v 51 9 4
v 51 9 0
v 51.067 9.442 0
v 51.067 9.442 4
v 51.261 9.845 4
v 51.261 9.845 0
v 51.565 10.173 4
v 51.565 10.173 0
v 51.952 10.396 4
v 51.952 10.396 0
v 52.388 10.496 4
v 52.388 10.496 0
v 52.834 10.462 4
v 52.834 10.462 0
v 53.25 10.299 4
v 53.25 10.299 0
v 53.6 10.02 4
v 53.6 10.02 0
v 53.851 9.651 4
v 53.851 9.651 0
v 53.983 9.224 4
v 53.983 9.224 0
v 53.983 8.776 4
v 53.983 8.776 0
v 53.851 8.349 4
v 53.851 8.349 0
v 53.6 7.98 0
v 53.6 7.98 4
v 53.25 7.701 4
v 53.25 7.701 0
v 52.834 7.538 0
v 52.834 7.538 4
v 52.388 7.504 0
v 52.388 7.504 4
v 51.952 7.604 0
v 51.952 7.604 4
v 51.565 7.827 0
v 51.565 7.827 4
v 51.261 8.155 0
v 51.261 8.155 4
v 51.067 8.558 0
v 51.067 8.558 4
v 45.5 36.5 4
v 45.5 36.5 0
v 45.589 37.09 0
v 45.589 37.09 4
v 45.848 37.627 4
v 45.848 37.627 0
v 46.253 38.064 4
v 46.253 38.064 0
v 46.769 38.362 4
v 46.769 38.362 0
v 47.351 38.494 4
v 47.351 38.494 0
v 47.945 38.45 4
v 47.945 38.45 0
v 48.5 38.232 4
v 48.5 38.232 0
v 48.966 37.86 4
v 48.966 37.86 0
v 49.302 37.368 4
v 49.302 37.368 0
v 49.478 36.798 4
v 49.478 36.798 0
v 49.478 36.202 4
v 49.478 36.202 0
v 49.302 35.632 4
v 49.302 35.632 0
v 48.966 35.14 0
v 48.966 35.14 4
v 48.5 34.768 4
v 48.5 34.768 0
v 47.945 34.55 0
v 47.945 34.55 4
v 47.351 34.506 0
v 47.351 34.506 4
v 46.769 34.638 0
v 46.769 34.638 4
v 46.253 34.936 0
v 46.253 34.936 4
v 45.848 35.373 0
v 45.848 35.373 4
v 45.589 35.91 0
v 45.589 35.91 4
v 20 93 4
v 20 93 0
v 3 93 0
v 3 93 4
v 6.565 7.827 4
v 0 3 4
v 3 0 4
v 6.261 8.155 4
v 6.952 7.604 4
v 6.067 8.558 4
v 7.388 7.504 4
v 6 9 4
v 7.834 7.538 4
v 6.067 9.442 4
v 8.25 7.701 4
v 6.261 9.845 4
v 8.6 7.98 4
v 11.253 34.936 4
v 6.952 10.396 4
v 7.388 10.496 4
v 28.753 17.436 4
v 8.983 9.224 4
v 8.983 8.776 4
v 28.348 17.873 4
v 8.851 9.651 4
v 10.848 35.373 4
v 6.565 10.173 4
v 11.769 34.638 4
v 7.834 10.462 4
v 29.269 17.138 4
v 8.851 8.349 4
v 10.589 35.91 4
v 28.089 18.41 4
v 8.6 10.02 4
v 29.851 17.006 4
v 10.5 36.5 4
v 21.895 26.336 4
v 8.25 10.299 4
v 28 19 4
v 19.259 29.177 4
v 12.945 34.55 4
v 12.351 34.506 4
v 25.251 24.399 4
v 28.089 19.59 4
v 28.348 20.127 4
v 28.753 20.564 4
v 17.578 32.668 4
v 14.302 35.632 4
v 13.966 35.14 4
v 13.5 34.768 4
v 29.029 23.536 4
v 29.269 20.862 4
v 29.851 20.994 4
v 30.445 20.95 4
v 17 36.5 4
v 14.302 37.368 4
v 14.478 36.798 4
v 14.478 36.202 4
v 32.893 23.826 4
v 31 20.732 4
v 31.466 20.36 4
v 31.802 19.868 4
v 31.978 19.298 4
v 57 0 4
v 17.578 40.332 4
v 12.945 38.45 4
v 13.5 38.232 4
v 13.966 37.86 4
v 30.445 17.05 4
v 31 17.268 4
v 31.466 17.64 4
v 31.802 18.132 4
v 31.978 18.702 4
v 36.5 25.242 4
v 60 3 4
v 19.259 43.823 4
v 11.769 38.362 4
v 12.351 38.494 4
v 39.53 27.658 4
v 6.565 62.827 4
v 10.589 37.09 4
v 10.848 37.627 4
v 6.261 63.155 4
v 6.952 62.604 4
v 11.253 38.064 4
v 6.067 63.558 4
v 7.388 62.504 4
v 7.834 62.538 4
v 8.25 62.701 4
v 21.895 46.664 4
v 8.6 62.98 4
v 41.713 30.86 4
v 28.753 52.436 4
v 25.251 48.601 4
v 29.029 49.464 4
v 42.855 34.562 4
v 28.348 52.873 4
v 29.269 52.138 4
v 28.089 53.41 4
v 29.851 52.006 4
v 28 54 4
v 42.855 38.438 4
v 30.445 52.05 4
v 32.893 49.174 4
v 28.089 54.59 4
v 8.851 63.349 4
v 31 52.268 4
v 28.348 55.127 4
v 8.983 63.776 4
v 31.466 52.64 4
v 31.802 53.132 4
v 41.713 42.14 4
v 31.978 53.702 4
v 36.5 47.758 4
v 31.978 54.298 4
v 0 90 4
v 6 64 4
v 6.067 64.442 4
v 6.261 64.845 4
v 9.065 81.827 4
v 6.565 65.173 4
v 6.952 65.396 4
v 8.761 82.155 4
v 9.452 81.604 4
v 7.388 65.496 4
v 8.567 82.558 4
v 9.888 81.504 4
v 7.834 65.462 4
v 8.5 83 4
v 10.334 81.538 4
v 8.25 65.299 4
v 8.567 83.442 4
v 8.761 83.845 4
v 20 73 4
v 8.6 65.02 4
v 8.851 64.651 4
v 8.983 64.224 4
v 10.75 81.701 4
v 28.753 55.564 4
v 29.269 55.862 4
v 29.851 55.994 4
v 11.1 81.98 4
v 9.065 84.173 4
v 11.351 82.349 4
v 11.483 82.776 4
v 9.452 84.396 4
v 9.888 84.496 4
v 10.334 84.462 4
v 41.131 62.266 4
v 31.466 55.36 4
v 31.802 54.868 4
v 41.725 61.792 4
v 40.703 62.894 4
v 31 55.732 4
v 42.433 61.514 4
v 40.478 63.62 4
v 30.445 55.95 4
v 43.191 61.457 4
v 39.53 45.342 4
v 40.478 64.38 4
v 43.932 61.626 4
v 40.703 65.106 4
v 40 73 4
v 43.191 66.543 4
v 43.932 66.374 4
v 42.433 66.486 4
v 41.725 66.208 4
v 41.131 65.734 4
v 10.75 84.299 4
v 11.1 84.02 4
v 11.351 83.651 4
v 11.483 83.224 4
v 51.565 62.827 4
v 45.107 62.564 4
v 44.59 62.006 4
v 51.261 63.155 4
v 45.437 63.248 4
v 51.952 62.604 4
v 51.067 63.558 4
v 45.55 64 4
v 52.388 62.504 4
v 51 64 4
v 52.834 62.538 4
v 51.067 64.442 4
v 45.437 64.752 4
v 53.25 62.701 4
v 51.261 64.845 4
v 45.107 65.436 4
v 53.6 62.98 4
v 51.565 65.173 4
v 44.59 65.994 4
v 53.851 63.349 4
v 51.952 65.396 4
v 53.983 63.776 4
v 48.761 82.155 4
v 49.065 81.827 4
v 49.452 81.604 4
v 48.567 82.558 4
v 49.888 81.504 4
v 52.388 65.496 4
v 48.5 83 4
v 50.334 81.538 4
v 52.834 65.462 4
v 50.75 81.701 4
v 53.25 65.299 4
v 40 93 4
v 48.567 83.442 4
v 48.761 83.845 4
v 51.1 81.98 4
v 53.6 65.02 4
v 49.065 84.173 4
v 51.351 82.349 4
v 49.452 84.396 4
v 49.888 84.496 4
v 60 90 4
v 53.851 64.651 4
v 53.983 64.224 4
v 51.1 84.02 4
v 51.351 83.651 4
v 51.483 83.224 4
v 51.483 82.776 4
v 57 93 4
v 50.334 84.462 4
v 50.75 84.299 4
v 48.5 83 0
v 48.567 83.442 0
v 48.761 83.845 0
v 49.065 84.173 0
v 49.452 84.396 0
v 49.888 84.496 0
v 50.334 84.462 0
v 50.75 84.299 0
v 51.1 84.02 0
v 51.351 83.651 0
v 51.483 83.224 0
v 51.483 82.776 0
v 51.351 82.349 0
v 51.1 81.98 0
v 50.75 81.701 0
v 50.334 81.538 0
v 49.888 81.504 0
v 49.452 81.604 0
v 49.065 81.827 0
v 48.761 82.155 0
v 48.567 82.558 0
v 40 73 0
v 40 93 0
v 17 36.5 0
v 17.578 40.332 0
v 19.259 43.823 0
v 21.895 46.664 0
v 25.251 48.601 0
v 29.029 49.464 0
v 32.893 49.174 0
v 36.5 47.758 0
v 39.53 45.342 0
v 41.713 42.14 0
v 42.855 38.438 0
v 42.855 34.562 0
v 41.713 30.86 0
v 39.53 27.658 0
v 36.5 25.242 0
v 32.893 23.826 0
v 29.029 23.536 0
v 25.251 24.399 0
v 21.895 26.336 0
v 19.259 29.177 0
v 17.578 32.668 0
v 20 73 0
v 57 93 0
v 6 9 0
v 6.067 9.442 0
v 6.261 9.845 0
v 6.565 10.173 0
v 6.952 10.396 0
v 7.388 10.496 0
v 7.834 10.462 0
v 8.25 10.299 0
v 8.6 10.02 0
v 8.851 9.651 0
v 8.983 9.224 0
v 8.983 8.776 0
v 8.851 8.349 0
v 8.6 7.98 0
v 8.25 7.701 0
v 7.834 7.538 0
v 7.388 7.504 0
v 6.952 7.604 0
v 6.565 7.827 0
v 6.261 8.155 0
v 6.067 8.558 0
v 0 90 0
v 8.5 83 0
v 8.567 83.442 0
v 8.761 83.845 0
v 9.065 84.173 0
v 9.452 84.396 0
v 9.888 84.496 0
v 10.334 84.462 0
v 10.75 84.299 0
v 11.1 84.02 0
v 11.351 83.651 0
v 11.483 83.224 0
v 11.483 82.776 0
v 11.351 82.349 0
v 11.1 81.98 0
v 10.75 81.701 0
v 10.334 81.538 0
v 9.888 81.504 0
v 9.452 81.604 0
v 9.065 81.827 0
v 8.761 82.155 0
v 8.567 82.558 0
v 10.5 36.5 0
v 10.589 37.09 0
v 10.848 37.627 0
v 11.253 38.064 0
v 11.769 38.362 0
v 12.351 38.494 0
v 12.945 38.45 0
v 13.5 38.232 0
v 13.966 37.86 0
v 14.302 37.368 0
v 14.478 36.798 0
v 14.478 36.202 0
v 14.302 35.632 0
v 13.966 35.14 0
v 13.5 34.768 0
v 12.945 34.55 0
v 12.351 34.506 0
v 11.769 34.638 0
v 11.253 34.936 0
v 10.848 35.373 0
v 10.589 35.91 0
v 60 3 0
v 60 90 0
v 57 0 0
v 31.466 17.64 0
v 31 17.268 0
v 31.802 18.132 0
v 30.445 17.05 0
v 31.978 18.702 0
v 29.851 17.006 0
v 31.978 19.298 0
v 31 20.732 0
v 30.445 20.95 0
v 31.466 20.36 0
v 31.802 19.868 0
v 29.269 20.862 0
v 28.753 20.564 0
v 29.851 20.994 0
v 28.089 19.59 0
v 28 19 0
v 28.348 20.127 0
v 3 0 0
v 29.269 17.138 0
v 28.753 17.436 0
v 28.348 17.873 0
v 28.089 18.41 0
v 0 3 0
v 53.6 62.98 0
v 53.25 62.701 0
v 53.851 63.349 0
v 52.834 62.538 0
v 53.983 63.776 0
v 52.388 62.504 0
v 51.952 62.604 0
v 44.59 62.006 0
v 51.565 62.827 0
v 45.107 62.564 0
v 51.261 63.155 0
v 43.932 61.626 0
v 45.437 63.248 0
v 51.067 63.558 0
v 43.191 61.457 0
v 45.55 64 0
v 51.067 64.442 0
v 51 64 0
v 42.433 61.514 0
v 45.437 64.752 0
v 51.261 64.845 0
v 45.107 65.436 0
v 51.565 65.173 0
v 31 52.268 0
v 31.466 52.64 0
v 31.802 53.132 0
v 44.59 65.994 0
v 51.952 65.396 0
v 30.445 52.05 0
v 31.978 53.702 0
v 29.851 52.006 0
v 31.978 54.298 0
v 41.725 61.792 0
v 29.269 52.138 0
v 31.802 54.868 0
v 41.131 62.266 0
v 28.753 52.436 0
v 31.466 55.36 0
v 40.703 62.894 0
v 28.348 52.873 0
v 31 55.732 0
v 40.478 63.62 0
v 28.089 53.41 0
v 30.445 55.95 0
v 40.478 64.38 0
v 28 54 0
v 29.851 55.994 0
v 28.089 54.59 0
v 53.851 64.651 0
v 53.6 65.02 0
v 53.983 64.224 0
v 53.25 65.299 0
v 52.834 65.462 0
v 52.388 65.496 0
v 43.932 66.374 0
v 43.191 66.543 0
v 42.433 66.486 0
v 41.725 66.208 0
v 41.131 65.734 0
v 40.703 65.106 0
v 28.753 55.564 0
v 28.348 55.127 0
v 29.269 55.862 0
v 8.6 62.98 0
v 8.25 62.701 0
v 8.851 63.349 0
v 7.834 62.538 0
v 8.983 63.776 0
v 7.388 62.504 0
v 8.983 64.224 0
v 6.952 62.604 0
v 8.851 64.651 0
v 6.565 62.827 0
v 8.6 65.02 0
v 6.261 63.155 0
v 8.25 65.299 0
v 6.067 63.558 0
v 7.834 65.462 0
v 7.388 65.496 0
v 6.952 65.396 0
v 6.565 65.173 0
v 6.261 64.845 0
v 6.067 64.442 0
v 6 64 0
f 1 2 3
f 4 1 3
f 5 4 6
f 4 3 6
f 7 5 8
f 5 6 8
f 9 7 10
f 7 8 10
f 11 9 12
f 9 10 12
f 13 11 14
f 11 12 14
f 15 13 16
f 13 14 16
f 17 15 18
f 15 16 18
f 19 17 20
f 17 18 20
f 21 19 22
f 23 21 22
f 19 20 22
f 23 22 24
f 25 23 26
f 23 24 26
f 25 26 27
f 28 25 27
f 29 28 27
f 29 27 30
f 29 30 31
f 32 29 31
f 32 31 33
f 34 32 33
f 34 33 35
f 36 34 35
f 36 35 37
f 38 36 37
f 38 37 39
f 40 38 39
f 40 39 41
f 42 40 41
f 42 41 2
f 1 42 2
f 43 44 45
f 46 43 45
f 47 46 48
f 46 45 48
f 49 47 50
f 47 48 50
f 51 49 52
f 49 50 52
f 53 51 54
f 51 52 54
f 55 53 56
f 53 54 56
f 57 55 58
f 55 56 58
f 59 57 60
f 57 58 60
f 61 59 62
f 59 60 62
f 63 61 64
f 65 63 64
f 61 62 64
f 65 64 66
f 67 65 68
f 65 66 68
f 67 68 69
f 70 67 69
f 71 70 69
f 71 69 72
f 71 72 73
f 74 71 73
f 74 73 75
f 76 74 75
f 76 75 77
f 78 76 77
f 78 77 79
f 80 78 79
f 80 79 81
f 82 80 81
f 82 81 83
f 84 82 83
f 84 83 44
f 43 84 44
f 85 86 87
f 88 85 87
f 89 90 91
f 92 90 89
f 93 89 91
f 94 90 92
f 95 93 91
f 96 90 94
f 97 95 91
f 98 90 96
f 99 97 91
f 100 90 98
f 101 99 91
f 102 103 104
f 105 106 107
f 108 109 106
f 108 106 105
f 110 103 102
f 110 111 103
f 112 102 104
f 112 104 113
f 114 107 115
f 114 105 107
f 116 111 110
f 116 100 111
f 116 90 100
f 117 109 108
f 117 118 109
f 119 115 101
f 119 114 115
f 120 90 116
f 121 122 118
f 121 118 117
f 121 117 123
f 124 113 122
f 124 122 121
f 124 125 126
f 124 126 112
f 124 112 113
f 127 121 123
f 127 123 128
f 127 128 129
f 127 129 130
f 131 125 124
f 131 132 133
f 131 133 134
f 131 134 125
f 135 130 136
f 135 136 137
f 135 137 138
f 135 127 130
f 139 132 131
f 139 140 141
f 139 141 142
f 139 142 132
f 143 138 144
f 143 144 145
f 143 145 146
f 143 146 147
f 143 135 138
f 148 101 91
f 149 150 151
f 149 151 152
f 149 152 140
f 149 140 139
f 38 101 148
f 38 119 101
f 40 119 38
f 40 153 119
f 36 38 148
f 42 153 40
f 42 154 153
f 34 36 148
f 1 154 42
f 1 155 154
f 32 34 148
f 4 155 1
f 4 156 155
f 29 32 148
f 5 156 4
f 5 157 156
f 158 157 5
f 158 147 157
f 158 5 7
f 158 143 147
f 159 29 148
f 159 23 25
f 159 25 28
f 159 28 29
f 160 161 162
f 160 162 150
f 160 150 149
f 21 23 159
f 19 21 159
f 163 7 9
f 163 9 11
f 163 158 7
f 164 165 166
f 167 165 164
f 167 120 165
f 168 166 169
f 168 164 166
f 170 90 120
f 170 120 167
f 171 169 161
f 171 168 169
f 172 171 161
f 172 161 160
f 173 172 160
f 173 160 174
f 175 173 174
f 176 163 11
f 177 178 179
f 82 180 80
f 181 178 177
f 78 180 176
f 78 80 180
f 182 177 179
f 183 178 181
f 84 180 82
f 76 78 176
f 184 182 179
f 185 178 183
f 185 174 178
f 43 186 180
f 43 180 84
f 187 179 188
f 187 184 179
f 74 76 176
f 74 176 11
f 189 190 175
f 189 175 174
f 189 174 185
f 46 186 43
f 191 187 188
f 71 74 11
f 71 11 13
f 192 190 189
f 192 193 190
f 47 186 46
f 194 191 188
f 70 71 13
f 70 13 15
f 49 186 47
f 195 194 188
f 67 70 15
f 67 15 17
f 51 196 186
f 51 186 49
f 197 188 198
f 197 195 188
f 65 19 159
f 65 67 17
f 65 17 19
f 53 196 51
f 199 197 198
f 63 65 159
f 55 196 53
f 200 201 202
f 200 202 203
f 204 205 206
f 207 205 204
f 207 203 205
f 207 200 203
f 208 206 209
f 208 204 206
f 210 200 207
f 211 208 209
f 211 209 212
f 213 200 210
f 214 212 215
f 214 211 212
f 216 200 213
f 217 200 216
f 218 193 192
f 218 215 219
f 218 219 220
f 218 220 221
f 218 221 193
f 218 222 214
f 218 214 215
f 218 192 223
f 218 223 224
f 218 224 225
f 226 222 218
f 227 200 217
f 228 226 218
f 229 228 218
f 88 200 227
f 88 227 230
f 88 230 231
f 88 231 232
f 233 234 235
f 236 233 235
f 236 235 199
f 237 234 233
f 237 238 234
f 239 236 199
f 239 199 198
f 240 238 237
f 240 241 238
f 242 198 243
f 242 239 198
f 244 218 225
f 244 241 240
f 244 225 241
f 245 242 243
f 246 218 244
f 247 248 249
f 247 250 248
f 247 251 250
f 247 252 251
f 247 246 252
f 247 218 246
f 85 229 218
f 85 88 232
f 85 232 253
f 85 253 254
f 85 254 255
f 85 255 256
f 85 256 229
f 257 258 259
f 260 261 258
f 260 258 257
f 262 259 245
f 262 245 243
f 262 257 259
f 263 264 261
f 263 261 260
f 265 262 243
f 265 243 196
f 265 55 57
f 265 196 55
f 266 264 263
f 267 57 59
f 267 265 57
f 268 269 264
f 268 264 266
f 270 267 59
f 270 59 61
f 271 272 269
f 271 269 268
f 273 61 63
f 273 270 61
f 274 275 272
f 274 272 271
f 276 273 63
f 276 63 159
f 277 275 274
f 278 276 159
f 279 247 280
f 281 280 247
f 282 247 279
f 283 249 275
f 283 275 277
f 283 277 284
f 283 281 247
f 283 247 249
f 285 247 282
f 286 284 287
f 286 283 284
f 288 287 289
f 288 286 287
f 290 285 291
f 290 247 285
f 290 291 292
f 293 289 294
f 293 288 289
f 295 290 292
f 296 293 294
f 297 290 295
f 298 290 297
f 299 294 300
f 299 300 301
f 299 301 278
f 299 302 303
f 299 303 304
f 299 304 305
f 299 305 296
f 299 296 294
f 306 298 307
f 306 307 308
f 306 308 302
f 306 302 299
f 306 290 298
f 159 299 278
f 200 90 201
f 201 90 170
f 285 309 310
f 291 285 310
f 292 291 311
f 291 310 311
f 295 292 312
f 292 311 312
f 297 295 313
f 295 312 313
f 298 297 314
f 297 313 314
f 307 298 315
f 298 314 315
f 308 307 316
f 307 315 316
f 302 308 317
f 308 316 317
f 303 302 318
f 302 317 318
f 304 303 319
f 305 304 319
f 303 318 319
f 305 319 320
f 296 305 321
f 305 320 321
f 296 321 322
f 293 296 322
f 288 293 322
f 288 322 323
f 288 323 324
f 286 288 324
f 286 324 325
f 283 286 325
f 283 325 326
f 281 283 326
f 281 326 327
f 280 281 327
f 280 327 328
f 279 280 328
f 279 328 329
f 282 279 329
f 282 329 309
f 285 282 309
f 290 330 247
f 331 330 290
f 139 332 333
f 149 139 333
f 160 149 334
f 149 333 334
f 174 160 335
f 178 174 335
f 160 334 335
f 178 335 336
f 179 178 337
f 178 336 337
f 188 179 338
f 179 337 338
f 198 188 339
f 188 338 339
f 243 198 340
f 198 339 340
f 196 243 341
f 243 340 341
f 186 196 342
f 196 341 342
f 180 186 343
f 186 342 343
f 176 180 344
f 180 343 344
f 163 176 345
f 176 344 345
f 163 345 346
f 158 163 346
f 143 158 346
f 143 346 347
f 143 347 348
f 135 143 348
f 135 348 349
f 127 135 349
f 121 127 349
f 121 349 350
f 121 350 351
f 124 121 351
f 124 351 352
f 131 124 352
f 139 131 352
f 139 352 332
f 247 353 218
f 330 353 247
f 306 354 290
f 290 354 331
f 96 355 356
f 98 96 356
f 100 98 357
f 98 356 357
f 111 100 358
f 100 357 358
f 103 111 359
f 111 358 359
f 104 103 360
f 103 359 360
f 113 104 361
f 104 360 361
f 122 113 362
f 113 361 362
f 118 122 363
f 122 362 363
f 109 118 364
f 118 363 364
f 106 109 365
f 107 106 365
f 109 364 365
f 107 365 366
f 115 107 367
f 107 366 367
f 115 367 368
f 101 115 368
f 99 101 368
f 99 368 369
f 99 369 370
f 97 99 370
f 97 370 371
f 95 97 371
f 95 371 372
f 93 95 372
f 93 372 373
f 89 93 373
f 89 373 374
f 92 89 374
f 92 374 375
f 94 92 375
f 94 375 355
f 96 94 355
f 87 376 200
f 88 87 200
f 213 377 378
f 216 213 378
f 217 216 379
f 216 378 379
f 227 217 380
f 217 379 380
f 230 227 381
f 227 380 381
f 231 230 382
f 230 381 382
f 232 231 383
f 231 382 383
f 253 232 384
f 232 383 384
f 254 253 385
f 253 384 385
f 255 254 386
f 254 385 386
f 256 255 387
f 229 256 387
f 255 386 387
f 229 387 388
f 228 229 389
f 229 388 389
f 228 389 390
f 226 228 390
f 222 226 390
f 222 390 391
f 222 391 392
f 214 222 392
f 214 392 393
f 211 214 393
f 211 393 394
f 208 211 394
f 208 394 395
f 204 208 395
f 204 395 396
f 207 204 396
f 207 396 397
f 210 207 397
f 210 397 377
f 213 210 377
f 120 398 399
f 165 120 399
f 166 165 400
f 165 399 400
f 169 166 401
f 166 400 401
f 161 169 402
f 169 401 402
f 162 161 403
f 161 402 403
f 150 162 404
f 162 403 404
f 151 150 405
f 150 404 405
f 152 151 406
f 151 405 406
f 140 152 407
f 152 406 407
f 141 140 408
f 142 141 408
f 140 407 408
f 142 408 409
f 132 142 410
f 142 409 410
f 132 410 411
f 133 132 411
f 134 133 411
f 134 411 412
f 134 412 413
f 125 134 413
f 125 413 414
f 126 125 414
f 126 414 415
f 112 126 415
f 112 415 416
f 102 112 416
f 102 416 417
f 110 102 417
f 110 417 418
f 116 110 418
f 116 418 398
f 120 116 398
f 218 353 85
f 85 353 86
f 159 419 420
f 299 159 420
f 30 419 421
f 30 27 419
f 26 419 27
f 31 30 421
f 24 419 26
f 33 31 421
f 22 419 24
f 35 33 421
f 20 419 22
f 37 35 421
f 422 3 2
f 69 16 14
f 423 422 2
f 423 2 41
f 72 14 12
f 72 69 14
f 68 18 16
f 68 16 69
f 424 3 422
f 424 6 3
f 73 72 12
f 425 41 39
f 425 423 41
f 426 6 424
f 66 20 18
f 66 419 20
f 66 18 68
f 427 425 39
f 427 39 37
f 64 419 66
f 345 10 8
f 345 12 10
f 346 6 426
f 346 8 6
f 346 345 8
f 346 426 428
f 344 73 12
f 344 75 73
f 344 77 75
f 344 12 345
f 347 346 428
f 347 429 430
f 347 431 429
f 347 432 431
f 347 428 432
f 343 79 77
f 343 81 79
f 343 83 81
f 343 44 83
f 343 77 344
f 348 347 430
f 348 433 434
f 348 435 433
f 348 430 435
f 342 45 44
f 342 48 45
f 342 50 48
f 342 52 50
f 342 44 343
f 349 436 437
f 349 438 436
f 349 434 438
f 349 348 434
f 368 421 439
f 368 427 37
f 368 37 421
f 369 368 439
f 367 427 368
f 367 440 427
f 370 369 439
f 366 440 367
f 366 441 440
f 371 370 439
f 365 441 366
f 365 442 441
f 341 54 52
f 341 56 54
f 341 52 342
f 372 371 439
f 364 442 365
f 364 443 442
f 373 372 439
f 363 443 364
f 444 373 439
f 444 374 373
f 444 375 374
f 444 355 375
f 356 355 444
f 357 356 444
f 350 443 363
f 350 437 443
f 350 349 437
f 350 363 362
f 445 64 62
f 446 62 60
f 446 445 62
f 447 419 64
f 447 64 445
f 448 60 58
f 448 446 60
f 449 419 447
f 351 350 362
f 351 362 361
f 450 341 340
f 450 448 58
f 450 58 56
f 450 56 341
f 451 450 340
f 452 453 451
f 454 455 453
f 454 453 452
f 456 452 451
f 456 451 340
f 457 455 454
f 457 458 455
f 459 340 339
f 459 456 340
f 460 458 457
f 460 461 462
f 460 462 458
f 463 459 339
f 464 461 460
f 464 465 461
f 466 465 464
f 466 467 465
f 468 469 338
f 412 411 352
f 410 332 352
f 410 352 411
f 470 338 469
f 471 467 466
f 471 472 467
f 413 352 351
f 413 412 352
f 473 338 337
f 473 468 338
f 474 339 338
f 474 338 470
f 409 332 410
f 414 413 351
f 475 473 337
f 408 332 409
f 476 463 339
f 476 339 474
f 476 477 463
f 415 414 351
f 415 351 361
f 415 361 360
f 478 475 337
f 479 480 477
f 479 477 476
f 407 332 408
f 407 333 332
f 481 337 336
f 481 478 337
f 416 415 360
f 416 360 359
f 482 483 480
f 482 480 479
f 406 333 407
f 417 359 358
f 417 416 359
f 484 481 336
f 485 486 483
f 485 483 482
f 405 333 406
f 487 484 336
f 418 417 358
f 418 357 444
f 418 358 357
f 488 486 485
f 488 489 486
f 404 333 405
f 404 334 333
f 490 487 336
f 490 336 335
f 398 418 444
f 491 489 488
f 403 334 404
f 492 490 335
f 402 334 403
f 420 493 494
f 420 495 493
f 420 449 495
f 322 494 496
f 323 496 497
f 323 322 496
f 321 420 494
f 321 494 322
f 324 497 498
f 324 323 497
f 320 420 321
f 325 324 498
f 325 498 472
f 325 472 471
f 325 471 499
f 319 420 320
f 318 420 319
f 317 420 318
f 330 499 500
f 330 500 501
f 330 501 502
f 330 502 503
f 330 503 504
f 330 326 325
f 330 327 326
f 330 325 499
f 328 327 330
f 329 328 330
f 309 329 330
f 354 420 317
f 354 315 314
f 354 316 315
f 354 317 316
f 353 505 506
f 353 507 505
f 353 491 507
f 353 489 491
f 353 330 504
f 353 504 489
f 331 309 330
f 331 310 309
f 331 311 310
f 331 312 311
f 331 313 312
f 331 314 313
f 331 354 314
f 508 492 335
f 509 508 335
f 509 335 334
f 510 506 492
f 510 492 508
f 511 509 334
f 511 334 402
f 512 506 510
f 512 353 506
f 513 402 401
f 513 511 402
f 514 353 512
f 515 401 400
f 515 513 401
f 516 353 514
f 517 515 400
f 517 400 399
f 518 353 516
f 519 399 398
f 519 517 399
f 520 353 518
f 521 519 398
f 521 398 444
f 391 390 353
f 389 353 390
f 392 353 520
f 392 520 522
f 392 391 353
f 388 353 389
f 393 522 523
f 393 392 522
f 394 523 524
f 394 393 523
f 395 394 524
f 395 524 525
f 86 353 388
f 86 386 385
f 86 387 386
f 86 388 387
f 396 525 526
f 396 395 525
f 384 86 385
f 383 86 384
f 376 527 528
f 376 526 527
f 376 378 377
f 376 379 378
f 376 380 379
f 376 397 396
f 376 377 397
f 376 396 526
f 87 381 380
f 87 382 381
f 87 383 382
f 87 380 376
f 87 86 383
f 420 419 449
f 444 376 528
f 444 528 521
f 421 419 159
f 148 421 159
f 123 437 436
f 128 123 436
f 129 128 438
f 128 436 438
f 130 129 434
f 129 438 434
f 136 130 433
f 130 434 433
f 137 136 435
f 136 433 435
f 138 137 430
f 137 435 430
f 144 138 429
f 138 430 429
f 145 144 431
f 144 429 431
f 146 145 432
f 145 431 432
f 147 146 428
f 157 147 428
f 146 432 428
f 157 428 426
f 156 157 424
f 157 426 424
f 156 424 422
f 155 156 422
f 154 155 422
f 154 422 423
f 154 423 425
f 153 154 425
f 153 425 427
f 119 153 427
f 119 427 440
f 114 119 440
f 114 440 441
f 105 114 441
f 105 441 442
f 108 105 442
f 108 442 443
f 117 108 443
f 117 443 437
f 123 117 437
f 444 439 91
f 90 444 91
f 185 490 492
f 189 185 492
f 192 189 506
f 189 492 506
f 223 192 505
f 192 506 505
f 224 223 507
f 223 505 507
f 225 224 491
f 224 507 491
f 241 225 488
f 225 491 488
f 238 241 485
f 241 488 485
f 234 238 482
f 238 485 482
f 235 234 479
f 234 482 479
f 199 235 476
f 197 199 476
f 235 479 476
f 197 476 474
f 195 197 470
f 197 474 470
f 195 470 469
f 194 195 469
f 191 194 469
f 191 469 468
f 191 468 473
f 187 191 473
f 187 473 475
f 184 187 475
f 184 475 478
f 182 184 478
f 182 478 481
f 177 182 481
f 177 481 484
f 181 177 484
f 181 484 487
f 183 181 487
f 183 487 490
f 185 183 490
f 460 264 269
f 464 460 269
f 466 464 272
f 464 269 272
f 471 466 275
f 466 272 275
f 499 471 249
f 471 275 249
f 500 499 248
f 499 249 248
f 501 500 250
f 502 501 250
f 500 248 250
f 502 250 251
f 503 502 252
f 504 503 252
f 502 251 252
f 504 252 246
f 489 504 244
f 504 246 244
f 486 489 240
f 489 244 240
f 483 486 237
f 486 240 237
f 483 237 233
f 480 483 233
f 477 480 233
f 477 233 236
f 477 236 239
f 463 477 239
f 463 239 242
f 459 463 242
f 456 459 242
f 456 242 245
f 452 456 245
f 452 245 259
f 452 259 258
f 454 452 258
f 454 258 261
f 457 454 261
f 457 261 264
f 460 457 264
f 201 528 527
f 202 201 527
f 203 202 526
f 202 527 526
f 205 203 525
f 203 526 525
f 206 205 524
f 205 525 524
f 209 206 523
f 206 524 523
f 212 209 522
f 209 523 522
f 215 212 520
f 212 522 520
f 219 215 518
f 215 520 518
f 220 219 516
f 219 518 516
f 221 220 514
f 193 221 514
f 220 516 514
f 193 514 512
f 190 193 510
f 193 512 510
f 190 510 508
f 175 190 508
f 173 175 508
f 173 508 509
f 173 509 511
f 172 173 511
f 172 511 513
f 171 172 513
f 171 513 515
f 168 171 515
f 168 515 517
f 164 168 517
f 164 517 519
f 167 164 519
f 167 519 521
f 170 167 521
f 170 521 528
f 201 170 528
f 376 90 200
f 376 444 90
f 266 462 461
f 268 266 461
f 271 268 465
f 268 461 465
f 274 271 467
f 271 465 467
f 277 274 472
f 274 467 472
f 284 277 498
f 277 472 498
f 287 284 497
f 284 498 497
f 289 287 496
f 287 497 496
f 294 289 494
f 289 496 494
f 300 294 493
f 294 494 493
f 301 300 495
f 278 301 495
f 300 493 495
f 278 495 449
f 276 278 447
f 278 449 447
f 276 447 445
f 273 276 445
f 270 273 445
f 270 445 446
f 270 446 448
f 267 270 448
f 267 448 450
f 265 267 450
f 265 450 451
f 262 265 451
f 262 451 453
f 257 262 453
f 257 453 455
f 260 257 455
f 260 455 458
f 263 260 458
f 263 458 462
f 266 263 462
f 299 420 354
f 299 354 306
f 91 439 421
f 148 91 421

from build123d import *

# Parameters (mm, degrees)
SKETCH1_W           = 60
SKETCH1_H           = 73
BOSS_EXTRUDE1_DEPTH = 6
SKETCH2_R           = 8
CUT_EXTRUDE1_DEPTH  = 95.683683917
SKETCH3_R           = 1.5
CUT_EXTRUDE2_DEPTH  = 95.683683917
SKETCH4_R           = 21
CUT_EXTRUDE3_DEPTH  = 4
SKETCH5_W           = 20
SKETCH5_H           = 20
BOSS_EXTRUDE2_DEPTH = 6
SKETCH6_R           = 1.5
CUT_EXTRUDE4_DEPTH  = 10
CHAMFER1_SIZE       = 3
CHAMFER2_SIZE       = 3
SKETCH7_R           = 2
CUT_EXTRUDE5_DEPTH  = 111.747460467
SKETCH8_R           = 13
CUT_EXTRUDE6_DEPTH  = 111.747460467
BOSS_EXTRUDE3_START = 4
SKETCH9_R           = 21
SKETCH9_R_2         = 2
SKETCH9_R_3         = 13
BOSS_EXTRUDE3_DEPTH = 4
CUT_EXTRUDE7_DEPTH  = 2
SKETCH12_R          = 2.55
CUT_EXTRUDE8_DEPTH  = 10


with BuildPart() as part:
    # Sketch1 → Boss-Extrude1 (new body)
    with BuildSketch(Plane.XY):
        with Locations((30, 36.5)):
            Rectangle(SKETCH1_W, SKETCH1_H)
    extrude(amount=BOSS_EXTRUDE1_DEPTH)

    # Sketch2 → Cut-Extrude1 (cut, through all)
    with BuildSketch(Plane(origin=(0, 0, 0), x_dir=(-1, 0, 0), z_dir=(0, 0, -1))):
        with Locations((-30, 36.5)):
            Circle(SKETCH2_R)
    extrude(amount=-CUT_EXTRUDE1_DEPTH, mode=Mode.SUBTRACT)

    # Sketch3 → Cut-Extrude2 (cut, through all)
    with BuildSketch(Plane(origin=(0, 0, 0), x_dir=(-1, 0, 0), z_dir=(0, 0, -1))):
        with Locations((-52.5, 64)):
            Circle(SKETCH3_R)
        with Locations((-7.5, 64)):
            Circle(SKETCH3_R)
        with Locations((-52.5, 9)):
            Circle(SKETCH3_R)
        with Locations((-7.5, 9)):
            Circle(SKETCH3_R)
    extrude(amount=-CUT_EXTRUDE2_DEPTH, mode=Mode.SUBTRACT)

    # Sketch4 → Cut-Extrude3 (cut)
    with BuildSketch(Plane(origin=(0, 0, 0), x_dir=(-1, 0, 0), z_dir=(0, 0, -1))):
        with Locations((-30, 36.5)):
            Circle(SKETCH4_R)
    extrude(amount=-CUT_EXTRUDE3_DEPTH, mode=Mode.SUBTRACT)

    # Sketch5 → Boss-Extrude2 (add)
    with BuildSketch(Plane(origin=(0, 0, 0), x_dir=(-1, 0, 0), z_dir=(0, 0, -1))):
        with Locations((-50, 83)):
            Rectangle(SKETCH5_W, SKETCH5_H)
        with Locations((-10, 83)):
            Rectangle(SKETCH5_W, SKETCH5_H)
    extrude(amount=-BOSS_EXTRUDE2_DEPTH)

    # Sketch6 → Cut-Extrude4 (cut)
    with BuildSketch(Plane(origin=(0, 0, 0), x_dir=(-1, 0, 0), z_dir=(0, 0, -1))):
        with Locations((-10, 83)):
            Circle(SKETCH6_R)
        with Locations((-50, 83)):
            Circle(SKETCH6_R)
    extrude(amount=-CUT_EXTRUDE4_DEPTH, mode=Mode.SUBTRACT)

    # Chamfer1
    chamfer1_edges = [part.edges().sort_by_distance(p)[0] for p in [
        (60, 0, 3),
        (0, 0, 3),
    ]]
    chamfer(chamfer1_edges, length=CHAMFER1_SIZE)

    # Chamfer2
    chamfer2_edges = [part.edges().sort_by_distance(p)[0] for p in [
        (60, 93, 3),
        (0, 93, 3),
    ]]
    chamfer(chamfer2_edges, length=CHAMFER2_SIZE)

    # Sketch7 → Cut-Extrude5 (cut, through all)
    with BuildSketch(Plane(origin=(0, 0, 4), x_dir=(-1, 0, 0), z_dir=(0, 0, -1))):
        with Locations((-30, 54)):
            Circle(SKETCH7_R)
        with Locations((-12.5, 36.5)):
            Circle(SKETCH7_R)
        with Locations((-30, 19)):
            Circle(SKETCH7_R)
        with Locations((-47.5, 36.5)):
            Circle(SKETCH7_R)
    extrude(amount=-CUT_EXTRUDE5_DEPTH, mode=Mode.SUBTRACT)

    # Sketch8 → Cut-Extrude6 (cut, through all)
    with BuildSketch(Plane(origin=(0, 0, 4), x_dir=(-1, 0, 0), z_dir=(0, 0, -1))):
        with Locations((-30, 36.5)):
            Circle(SKETCH8_R)
    extrude(amount=-CUT_EXTRUDE6_DEPTH, mode=Mode.SUBTRACT)

    # Sketch9 → Boss-Extrude3 (add)
    with BuildSketch(Plane(origin=(0, 0, 4), x_dir=(-1, 0, 0), z_dir=(0, 0, -1)).offset(BOSS_EXTRUDE3_START)):
        with Locations((-30, 36.5)):
            Circle(SKETCH9_R)
        with Locations((-30, 54)):
            Circle(SKETCH9_R_2, mode=Mode.SUBTRACT)
        with Locations((-30, 19)):
            Circle(SKETCH9_R_2, mode=Mode.SUBTRACT)
        with Locations((-47.5, 36.5)):
            Circle(SKETCH9_R_2, mode=Mode.SUBTRACT)
        with Locations((-12.5, 36.5)):
            Circle(SKETCH9_R_2, mode=Mode.SUBTRACT)
        with Locations((-30, 36.5)):
            Circle(SKETCH9_R_3, mode=Mode.SUBTRACT)
    extrude(amount=-BOSS_EXTRUDE3_DEPTH)

    # Sketch11 → Cut-Extrude7 (cut)
    with BuildSketch(Plane.XY.offset(6)):
        Polygon((60, 3), (60, 90), (57, 93), (40, 93), (40, 73), (20, 73), (20, 93), (3, 93), (0, 90), (0, 3), (3, 0), (57, 0), align=None)
    extrude(amount=-CUT_EXTRUDE7_DEPTH, mode=Mode.SUBTRACT)

    # Sketch12 → Cut-Extrude8 (cut)
    with BuildSketch(Plane.XY.offset(4)):
        with Locations((43, 64)):
            Circle(SKETCH12_R)
    extrude(amount=-CUT_EXTRUDE8_DEPTH, mode=Mode.SUBTRACT)


solid = part.part
